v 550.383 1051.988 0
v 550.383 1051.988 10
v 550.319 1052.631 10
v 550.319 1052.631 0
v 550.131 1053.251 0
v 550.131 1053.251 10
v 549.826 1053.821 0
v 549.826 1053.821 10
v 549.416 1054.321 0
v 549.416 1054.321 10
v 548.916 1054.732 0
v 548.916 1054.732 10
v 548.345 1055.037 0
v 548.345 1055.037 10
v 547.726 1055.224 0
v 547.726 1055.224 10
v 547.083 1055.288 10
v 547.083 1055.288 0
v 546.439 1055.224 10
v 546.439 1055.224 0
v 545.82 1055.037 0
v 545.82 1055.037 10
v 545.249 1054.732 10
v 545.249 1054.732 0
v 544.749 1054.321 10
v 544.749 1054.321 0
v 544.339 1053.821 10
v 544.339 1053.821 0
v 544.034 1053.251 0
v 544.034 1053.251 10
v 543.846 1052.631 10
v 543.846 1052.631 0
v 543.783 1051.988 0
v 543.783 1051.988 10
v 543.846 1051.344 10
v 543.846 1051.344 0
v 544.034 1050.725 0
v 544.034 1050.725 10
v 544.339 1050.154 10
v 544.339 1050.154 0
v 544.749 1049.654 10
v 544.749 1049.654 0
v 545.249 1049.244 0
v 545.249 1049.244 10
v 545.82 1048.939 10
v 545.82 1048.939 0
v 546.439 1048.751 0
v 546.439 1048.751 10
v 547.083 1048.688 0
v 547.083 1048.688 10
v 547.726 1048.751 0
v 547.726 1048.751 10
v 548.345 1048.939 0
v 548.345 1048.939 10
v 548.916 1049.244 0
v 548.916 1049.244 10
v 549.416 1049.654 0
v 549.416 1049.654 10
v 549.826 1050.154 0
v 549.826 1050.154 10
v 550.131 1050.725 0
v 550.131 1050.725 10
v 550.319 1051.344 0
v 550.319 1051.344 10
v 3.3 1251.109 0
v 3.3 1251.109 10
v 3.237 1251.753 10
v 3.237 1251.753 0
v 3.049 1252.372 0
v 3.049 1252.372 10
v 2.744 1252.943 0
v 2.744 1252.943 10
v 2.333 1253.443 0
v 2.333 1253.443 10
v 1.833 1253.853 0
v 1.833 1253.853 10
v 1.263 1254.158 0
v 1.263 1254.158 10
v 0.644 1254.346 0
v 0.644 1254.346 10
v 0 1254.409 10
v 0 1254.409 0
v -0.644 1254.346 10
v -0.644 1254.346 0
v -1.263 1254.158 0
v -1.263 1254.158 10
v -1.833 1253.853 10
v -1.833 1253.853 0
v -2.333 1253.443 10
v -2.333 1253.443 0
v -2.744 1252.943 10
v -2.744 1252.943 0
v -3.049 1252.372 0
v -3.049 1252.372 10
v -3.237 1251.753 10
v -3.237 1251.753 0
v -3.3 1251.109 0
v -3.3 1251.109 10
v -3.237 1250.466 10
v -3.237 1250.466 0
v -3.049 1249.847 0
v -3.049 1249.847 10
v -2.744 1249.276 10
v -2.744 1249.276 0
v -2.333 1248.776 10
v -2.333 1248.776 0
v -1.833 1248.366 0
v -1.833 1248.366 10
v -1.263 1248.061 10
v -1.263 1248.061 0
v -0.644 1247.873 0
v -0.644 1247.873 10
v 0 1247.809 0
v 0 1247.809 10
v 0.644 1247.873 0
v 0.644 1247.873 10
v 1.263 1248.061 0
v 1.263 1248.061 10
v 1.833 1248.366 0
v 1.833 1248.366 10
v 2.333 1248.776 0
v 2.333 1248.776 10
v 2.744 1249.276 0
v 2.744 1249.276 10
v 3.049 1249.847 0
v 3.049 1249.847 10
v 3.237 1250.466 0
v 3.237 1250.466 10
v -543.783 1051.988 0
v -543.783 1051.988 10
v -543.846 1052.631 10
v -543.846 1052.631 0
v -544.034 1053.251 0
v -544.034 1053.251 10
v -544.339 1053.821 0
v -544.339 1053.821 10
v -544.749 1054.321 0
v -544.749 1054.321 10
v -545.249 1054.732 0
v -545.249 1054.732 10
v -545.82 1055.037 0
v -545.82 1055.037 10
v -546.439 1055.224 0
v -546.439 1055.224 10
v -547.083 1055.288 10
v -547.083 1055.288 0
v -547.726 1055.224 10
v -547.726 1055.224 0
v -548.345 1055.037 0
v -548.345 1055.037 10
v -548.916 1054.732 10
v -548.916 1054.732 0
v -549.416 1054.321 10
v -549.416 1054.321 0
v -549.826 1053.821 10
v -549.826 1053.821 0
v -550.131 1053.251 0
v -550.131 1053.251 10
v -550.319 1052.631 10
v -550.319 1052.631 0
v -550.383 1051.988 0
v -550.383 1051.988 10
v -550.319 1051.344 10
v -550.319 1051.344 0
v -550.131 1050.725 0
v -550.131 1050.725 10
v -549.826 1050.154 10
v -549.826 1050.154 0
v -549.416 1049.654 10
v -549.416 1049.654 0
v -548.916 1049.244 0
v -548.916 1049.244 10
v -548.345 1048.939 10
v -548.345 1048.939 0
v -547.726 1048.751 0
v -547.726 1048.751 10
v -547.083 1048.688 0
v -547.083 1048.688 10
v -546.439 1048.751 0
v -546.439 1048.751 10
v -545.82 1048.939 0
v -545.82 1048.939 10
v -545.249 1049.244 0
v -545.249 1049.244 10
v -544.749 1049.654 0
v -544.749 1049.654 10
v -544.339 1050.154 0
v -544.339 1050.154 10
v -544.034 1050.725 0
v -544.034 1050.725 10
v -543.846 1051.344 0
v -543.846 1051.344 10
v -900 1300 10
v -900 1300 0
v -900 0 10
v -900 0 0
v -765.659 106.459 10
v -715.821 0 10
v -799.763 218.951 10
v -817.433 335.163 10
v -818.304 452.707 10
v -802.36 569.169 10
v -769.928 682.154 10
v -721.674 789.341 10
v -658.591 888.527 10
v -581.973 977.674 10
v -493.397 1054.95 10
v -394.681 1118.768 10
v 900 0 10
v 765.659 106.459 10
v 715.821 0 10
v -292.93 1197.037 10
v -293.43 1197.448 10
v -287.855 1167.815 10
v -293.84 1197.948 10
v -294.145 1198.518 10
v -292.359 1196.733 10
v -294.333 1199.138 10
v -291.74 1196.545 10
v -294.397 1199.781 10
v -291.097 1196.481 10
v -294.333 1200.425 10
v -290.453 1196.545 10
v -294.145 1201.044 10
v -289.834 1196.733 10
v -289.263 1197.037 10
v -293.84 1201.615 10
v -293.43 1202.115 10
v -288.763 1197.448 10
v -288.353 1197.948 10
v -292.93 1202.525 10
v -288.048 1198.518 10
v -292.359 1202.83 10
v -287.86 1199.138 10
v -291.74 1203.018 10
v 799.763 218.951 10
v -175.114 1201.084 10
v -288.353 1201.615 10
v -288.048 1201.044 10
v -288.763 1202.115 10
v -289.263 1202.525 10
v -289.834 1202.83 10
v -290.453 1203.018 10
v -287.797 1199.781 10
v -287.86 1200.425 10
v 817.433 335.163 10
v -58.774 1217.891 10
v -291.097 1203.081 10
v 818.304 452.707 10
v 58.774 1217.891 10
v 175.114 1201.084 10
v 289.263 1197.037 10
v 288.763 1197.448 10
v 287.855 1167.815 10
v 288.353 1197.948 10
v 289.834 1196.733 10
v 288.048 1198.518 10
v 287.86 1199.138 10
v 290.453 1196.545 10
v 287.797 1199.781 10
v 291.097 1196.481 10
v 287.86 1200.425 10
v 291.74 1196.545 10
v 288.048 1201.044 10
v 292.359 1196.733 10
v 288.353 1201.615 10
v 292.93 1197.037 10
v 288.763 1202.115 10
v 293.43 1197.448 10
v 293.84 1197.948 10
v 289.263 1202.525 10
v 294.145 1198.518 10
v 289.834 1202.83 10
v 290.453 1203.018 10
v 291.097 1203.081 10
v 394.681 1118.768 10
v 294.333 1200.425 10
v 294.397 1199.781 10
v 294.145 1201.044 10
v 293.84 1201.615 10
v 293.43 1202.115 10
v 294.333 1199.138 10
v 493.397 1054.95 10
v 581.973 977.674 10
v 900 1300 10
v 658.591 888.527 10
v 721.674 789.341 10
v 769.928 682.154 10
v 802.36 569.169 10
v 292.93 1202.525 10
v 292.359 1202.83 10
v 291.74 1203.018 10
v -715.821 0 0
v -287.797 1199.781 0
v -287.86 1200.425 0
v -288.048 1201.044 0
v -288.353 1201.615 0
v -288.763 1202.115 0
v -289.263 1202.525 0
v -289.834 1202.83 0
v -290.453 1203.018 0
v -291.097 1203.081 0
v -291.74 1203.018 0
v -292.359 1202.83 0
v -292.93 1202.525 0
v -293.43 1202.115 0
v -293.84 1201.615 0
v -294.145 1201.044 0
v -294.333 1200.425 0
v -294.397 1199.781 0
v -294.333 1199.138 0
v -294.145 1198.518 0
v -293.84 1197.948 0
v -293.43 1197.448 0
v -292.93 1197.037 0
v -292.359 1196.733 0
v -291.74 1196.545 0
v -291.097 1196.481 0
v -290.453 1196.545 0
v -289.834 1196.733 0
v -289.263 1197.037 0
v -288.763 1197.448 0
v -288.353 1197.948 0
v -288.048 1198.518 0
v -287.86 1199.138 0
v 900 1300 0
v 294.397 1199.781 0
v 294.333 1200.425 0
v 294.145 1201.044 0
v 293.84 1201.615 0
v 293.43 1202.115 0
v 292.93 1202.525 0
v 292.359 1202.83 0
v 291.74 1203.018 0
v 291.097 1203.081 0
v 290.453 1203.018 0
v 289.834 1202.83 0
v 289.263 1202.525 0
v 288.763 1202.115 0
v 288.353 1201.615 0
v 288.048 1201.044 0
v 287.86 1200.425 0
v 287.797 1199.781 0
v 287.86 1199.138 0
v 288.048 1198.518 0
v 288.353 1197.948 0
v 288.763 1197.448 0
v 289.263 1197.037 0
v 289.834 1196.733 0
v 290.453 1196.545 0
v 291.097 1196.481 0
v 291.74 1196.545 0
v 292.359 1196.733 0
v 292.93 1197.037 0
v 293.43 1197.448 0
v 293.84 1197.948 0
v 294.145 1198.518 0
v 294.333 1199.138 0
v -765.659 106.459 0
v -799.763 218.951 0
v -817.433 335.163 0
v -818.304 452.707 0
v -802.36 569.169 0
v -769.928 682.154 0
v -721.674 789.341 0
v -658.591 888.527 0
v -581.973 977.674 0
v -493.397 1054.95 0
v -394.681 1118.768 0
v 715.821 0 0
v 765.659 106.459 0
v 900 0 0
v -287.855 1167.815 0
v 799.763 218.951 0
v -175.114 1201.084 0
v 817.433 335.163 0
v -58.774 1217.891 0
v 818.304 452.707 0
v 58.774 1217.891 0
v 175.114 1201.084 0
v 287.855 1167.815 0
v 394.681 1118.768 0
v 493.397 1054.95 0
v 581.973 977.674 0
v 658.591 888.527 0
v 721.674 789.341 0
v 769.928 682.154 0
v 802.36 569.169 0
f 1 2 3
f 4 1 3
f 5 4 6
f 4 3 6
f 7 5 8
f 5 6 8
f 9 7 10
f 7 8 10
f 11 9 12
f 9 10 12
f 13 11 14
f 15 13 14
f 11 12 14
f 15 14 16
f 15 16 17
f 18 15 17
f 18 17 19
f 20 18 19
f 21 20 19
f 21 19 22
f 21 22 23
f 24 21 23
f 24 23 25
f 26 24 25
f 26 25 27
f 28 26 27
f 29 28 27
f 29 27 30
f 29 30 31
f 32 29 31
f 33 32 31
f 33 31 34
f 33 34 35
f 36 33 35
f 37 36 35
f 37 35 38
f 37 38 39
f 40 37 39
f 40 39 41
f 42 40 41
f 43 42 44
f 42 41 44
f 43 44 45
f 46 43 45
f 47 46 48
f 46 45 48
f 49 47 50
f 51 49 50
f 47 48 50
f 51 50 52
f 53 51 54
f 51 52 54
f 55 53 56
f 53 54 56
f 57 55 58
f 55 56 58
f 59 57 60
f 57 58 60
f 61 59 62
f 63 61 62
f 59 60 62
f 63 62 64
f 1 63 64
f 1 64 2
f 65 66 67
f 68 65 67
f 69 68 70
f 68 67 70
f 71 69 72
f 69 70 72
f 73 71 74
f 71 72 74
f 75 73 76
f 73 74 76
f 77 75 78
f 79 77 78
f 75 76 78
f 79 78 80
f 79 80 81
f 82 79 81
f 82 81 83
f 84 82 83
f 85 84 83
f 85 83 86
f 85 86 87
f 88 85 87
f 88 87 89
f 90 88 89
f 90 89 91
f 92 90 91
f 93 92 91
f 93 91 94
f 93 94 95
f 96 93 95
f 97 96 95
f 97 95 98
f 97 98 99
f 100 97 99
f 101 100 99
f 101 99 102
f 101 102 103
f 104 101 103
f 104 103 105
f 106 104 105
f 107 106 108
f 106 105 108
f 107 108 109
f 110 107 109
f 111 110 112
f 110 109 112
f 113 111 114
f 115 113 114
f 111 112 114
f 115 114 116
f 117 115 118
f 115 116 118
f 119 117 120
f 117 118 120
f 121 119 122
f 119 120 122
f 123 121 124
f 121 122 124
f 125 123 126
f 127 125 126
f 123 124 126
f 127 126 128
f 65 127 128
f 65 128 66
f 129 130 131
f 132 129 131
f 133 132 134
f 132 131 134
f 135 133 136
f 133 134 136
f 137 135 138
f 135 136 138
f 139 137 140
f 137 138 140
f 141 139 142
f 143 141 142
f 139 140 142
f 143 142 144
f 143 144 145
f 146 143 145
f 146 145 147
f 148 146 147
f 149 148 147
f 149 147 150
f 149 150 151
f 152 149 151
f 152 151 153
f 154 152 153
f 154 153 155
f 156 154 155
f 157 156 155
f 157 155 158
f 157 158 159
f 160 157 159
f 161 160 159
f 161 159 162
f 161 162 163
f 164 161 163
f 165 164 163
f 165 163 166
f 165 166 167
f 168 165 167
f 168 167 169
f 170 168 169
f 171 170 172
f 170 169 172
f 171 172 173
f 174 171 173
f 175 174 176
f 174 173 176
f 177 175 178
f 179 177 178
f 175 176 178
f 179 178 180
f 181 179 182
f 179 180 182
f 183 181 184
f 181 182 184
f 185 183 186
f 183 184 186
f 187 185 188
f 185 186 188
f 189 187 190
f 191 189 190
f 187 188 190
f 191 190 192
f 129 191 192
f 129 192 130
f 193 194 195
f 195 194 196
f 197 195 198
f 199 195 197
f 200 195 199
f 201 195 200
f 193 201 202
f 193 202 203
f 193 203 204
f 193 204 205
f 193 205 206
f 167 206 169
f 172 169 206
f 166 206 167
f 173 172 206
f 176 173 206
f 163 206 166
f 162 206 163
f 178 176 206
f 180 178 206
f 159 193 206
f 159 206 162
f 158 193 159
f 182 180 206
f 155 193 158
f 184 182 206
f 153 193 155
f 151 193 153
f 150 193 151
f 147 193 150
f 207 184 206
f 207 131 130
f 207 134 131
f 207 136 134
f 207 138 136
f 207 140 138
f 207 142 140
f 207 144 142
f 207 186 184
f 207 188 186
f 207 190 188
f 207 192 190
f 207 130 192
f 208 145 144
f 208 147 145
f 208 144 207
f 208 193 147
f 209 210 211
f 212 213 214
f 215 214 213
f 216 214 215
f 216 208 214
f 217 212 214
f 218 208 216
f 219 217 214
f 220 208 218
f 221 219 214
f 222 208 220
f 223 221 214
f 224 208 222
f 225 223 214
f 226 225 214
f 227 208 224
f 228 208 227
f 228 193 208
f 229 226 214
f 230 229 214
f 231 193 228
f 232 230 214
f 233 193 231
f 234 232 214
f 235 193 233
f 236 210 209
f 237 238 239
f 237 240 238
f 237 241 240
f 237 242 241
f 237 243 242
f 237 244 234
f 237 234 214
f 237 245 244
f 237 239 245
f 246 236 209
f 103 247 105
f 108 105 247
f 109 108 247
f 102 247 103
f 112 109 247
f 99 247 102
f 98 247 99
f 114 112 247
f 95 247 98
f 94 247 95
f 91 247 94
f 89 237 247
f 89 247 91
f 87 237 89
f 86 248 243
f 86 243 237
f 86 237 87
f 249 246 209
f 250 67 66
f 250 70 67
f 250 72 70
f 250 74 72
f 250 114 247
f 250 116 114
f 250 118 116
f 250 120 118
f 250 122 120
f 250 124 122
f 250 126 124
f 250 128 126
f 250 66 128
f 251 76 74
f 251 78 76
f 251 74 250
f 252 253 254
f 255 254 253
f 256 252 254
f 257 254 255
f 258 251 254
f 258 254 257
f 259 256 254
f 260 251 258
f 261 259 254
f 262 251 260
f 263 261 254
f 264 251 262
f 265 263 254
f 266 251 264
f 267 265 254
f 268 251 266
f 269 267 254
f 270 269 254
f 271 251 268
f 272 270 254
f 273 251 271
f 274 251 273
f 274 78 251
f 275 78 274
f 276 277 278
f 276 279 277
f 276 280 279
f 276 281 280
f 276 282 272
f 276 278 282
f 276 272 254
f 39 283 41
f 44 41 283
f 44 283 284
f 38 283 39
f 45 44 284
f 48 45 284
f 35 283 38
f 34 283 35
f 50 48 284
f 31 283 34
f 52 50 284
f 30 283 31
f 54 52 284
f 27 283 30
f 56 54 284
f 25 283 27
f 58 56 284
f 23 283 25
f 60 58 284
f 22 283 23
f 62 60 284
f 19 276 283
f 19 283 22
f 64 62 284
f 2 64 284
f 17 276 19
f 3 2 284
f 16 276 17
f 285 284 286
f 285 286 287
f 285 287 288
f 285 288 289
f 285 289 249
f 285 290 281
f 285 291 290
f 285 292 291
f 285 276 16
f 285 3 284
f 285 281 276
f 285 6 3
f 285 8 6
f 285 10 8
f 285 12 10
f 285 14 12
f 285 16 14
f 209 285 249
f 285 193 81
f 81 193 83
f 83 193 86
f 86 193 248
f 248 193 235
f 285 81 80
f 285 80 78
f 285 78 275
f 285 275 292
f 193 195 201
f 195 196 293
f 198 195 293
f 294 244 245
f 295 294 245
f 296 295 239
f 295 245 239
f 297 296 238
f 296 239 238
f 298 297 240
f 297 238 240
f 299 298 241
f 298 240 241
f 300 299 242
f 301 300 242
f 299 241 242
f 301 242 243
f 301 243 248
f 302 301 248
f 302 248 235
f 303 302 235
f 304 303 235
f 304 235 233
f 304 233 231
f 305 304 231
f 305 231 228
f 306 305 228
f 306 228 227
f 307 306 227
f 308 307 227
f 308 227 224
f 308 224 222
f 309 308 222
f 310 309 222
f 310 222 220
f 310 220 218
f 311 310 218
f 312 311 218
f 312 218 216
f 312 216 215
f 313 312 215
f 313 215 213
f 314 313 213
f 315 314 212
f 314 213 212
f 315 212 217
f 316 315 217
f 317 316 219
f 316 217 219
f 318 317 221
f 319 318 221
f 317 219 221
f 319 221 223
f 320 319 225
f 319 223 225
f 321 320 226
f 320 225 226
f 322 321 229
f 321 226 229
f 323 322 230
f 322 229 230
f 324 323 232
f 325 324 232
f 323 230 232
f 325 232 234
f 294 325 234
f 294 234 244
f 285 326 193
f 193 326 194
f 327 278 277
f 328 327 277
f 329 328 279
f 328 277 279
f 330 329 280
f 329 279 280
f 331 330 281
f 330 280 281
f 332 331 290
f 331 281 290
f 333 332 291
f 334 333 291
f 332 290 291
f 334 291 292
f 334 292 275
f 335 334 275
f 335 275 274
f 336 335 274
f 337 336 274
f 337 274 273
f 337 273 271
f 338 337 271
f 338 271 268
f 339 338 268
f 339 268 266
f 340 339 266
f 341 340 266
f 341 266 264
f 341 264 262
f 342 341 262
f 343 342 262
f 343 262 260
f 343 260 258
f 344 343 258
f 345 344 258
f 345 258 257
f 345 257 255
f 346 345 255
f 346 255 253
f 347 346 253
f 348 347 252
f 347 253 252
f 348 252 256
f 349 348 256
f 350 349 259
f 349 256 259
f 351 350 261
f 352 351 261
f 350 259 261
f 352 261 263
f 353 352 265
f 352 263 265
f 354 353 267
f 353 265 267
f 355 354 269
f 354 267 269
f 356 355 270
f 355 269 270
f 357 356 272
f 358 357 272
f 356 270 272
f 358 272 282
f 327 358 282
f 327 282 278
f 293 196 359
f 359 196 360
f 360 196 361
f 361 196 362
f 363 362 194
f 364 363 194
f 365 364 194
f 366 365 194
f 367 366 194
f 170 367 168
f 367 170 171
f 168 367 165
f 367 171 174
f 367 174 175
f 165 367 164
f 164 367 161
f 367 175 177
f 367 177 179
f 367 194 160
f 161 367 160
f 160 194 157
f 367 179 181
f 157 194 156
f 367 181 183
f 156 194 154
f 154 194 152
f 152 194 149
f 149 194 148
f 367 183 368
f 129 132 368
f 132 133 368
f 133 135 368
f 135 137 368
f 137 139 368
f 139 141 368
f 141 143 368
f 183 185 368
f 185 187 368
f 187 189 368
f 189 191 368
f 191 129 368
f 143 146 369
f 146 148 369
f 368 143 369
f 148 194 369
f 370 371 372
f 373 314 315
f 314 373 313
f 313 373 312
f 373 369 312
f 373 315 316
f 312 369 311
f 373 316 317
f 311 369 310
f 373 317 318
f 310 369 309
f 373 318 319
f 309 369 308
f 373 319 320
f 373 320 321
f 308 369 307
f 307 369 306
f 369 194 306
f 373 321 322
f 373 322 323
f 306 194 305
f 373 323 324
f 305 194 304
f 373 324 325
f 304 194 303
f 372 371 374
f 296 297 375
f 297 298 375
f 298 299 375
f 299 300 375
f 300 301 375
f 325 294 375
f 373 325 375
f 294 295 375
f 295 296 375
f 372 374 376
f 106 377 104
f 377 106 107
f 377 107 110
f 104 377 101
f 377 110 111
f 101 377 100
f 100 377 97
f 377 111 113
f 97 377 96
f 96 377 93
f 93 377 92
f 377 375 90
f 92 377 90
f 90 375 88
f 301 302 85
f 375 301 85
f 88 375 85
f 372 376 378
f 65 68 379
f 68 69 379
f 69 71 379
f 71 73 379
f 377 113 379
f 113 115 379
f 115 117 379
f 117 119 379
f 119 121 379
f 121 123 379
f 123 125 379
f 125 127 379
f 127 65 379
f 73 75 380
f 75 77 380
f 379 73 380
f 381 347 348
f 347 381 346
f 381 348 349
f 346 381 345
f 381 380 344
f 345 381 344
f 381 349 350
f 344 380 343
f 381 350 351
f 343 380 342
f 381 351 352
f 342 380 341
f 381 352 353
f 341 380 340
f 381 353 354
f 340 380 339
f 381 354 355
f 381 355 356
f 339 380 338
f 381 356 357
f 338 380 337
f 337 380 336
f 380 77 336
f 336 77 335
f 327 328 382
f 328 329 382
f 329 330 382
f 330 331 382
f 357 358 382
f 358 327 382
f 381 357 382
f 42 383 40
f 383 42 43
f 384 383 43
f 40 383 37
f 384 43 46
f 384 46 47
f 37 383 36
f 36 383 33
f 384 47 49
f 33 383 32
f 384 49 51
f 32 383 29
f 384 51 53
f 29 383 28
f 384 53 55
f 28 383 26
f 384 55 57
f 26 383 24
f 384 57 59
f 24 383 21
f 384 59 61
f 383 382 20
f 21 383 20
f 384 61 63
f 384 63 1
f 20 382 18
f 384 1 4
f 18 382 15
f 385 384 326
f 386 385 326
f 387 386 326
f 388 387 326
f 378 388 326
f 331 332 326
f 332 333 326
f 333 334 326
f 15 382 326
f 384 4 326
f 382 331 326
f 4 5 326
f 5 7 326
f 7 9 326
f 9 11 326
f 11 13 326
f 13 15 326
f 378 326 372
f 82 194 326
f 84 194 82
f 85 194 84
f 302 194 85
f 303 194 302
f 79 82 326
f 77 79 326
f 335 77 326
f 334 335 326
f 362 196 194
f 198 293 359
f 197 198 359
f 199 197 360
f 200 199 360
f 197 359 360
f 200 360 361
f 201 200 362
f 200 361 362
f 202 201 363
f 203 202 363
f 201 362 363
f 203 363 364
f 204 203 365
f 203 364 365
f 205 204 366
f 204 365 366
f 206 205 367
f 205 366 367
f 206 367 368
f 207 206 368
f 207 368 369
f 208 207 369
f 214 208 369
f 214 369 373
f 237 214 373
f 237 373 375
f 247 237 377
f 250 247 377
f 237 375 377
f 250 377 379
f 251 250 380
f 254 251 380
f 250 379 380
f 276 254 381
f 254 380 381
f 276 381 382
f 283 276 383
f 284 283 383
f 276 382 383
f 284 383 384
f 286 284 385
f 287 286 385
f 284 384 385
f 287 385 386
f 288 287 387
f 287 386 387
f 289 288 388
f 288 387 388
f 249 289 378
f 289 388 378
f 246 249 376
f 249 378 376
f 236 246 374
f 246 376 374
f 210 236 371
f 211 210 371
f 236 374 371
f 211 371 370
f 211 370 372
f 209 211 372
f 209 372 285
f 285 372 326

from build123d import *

# Parameters (mm, degrees)
RESSALTO_EXTRUS_O1_DEPTH = 10
FURO_COM_FOLGA_DE_M61_D  = 6.6


with BuildPart() as part:
    # Esboço1 → Ressalto-extrusão1 (new body)
    with BuildSketch(Plane.XY):
        with BuildLine():
            Line((715.821206727, 0), (900, 0))
            Line((900, 0), (900, 1300))
            Line((900, 1300), (-900, 1300))
            Line((-900, 1300), (-900, 0))
            Line((-900, 0), (-715.821206727, 0))
            ThreePointArc((-715.821206727, 0), (0, 1220), (715.821206727, 0))
        make_face()
    extrude(amount=RESSALTO_EXTRUS_O1_DEPTH)

    # Furo com folga de M61 (through all)
    with Locations(Plane(origin=(0, 400, -6), x_dir=(-1, 0, 0), z_dir=(0, 0, -1))):
        with Locations((0, 851.109495843), (291.096591754, 799.781312724), (547.082638414, 651.987699776), (-291.096591754, 799.781312724), (-547.082638414, 651.987699776)):
            Hole(FURO_COM_FOLGA_DE_M61_D / 2)


solid = part.part
